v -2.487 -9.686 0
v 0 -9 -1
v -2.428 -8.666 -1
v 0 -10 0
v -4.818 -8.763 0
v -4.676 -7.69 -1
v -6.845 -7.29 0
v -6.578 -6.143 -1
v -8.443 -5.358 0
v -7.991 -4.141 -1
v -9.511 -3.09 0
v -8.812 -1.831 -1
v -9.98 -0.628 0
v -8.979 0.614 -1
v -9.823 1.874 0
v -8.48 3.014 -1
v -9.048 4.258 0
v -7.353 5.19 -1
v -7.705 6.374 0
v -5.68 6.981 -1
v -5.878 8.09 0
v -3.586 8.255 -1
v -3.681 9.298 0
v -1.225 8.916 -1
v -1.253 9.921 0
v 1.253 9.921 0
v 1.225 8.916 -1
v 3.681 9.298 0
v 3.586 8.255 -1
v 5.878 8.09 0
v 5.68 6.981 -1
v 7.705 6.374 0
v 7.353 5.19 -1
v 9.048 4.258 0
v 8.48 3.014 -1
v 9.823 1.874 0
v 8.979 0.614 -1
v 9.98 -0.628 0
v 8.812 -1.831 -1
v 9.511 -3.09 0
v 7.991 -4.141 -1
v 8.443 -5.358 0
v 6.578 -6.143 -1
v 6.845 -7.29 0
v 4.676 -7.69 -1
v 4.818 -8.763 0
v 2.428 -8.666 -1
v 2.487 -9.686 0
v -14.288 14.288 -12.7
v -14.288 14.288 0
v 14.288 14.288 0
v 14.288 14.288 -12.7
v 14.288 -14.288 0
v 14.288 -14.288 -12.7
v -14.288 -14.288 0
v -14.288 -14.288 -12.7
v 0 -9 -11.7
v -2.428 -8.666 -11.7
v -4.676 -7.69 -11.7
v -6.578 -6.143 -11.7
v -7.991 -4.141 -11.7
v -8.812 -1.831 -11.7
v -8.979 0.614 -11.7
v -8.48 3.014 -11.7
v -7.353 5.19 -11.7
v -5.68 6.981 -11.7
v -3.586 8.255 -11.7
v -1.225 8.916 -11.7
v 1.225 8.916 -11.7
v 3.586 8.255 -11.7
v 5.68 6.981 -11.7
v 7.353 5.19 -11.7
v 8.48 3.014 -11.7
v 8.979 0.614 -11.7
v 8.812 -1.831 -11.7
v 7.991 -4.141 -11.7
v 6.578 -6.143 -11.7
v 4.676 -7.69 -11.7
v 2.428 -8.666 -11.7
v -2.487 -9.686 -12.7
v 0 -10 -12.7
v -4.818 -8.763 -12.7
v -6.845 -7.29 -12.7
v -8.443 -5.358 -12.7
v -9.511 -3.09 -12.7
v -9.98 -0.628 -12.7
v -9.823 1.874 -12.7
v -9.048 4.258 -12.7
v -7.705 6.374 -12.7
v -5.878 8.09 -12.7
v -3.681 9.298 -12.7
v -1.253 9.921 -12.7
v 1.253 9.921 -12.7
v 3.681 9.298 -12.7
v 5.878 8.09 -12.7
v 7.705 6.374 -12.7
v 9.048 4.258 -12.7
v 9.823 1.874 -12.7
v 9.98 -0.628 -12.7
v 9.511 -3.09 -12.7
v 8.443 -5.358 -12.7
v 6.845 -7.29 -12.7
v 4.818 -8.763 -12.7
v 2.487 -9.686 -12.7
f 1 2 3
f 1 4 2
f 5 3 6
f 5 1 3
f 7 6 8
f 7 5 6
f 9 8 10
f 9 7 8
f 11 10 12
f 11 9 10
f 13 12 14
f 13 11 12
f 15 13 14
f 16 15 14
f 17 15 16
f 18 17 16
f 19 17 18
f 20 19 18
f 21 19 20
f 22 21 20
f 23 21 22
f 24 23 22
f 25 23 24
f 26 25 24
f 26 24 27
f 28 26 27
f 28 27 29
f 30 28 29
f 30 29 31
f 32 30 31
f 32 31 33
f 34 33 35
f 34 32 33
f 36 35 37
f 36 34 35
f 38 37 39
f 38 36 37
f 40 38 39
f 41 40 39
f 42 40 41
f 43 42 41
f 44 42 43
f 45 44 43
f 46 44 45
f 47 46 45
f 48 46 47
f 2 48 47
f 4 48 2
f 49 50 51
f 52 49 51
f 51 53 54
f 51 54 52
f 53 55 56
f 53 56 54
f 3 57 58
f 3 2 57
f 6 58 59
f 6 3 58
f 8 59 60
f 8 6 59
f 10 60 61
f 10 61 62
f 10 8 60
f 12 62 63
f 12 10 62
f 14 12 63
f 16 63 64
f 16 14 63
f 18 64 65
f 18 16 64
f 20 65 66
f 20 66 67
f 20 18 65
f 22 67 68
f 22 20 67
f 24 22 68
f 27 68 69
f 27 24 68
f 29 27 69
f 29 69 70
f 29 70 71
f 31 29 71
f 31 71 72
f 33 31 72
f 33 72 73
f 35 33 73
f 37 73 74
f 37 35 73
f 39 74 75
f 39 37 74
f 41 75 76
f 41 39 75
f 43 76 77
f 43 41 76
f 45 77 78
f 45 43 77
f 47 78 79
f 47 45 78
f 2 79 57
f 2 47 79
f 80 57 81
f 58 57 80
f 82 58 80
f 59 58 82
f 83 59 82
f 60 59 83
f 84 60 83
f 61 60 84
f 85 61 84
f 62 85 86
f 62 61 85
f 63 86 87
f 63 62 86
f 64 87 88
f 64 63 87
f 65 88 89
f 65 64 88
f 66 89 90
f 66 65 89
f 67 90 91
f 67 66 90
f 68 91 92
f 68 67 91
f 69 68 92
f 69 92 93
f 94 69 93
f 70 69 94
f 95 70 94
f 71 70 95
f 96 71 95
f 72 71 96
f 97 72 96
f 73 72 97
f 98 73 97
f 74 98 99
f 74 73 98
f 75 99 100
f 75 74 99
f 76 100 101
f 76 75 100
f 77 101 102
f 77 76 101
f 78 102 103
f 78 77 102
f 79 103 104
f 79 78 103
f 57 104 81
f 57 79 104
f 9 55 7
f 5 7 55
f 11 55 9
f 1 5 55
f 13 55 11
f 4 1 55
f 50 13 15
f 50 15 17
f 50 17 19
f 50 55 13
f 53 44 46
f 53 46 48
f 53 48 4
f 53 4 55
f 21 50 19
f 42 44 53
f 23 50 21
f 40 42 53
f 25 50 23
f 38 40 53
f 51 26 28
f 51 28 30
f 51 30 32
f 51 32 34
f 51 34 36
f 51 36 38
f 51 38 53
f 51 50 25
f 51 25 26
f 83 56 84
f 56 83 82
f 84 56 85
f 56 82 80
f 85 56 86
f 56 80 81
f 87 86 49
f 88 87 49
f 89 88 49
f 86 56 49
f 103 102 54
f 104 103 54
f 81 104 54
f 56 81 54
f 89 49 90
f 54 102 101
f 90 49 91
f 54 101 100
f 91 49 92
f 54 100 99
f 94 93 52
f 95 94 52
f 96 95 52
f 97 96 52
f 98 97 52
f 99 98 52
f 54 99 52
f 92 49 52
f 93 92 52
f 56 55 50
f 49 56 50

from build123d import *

# Parameters (mm, degrees)
SKETCH_W            = 28.575
SKETCH_H            = 28.575
BOSS_EXTRUDE1_DEPTH = 12.7


with BuildPart() as part:
    # Sketch → Boss-Extrude1 (new body)
    with BuildSketch(Plane.XY):
        Rectangle(SKETCH_W, SKETCH_H)
    extrude(amount=-BOSS_EXTRUDE1_DEPTH)

    # Sketch1 → M20x2.0 Tapped Hole1 (revolve, cut)
    with BuildSketch(Plane(origin=(0, 0, 0), x_dir=(0, -1, 0), z_dir=(1, 0, 0))):
        Polygon((0, 0), (0, 12.7), (10, 12.7), (9, 11.7), (9, 1), (10, 0), align=None)
    revolve(axis=Axis((0, 0, 6.35), (0, 0, -1)), mode=Mode.SUBTRACT)


solid = part.part
